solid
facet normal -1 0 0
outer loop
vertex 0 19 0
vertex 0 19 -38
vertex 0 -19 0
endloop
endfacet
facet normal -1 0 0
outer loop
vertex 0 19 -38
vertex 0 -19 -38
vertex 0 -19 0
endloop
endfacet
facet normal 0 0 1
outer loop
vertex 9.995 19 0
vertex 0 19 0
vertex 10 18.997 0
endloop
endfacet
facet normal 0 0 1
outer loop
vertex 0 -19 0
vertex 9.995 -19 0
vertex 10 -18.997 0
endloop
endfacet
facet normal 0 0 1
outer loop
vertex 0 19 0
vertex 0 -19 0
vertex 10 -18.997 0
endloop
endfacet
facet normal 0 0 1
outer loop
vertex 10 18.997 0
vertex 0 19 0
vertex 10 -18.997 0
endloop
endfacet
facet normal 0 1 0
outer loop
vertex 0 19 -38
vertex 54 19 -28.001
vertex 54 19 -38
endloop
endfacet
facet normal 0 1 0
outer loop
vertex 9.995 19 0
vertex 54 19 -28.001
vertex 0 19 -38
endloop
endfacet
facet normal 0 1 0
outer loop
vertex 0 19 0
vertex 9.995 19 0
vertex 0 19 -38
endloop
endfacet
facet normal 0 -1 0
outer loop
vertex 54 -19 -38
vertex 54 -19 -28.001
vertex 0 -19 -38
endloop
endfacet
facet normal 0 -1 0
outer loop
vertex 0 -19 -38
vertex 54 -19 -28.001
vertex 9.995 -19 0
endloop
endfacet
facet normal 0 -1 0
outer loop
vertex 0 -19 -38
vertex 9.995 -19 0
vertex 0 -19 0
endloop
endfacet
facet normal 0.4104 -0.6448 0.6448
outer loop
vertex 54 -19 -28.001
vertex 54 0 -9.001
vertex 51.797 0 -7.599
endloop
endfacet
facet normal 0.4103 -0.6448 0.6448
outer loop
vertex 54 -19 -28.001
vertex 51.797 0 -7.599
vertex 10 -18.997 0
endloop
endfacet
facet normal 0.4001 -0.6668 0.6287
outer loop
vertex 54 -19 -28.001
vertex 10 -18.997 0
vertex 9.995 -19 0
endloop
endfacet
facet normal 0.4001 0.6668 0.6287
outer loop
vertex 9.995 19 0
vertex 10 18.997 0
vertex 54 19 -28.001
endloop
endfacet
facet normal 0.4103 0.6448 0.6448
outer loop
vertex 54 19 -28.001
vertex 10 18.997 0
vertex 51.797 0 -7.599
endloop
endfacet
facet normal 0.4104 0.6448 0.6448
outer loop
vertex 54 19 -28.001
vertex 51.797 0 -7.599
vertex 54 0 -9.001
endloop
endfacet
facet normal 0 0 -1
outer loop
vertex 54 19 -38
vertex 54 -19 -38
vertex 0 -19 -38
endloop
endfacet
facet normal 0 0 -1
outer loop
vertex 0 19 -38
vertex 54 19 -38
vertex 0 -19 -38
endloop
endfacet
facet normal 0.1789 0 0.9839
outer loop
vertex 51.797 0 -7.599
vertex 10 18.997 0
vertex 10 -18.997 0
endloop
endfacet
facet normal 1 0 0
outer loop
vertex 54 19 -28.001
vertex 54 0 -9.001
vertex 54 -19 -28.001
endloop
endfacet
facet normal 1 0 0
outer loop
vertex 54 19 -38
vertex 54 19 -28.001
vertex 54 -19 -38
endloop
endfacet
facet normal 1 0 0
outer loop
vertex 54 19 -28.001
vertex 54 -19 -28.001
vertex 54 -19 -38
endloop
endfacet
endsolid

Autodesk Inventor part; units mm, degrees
ref_plane "YZ Plane" through (0, 0, 0) normal (1, 0, 0) x (0, 1, 0)
ref_plane "XZ Plane" through (0, 0, 0) normal (0, 1, 0) x (-1, 0, 0)
sketch "草圖1" plane through (0, 0, 0) normal (0, 1, 0) x (-1, 0, 0)
  line L0 (0, 0) -> (-54, 0)
  line L1 (-54, 0) -> (-54, -38)
  line L2 (-54, -38) -> (0, -38)
  line L3 (0, -38) -> (0, 0)
  dimension "d0" = 54
  dimension "d1" = 38
extrude "擠出1" add sketch "草圖1" along normal mid plane 38
sketch "草圖2" plane through (0, 19, 0) normal (0, 1, 0) x (1, 0, 0)
  line L0 (0, 0) -> (54, 0) projected
  line L1 (10, 0) -> (54, 8)
  line L2 (54, 0) -> (54, 38) projected
  dimension "d4" = 10
  dimension "d5" = 30
extrude "擠出2" cut sketch "草圖2" against normal blind 40
sketch "草圖3" plane through (54, -19, -38) normal (1, 0, 0) x (0, 0, -1)
  line L0 (-30, 18) -> (-10, 38)
  line L1 (0, 38) -> (-38, 38) projected
  line L2 (-30, 38) -> (-30, 0) projected
  point P0 (-38, 19)
  dimension "d8" = 20
  dimension "d9" = 20
ref_plane "工作平面1" through (10, 19, 0) normal (-0.4103, -0.6448, -0.6448) x (0.8437, 0, -0.5369)
sketch "草圖4" plane through (10, 19, 0) normal (-0.4103, -0.6448, -0.6448) x (0.8437, 0, -0.5369)
  line L0 (-15.1543, -12.3218) -> (93.717, -12.3218)
  line L1 (93.717, -12.3218) -> (93.717, 28.8166)
  line L2 (93.717, 28.8166) -> (-15.1543, 28.8166)
  line L3 (-15.1543, 28.8166) -> (-15.1543, -12.3218)
  point P0 (-8.4366, 11.0602)
extrude "擠出3" cut sketch "草圖4" against normal blind 40
mirror "鏡射1" about plane through (0, 0, 0) normal (0, 1, 0) of "擠出3"
properties part number "26"
